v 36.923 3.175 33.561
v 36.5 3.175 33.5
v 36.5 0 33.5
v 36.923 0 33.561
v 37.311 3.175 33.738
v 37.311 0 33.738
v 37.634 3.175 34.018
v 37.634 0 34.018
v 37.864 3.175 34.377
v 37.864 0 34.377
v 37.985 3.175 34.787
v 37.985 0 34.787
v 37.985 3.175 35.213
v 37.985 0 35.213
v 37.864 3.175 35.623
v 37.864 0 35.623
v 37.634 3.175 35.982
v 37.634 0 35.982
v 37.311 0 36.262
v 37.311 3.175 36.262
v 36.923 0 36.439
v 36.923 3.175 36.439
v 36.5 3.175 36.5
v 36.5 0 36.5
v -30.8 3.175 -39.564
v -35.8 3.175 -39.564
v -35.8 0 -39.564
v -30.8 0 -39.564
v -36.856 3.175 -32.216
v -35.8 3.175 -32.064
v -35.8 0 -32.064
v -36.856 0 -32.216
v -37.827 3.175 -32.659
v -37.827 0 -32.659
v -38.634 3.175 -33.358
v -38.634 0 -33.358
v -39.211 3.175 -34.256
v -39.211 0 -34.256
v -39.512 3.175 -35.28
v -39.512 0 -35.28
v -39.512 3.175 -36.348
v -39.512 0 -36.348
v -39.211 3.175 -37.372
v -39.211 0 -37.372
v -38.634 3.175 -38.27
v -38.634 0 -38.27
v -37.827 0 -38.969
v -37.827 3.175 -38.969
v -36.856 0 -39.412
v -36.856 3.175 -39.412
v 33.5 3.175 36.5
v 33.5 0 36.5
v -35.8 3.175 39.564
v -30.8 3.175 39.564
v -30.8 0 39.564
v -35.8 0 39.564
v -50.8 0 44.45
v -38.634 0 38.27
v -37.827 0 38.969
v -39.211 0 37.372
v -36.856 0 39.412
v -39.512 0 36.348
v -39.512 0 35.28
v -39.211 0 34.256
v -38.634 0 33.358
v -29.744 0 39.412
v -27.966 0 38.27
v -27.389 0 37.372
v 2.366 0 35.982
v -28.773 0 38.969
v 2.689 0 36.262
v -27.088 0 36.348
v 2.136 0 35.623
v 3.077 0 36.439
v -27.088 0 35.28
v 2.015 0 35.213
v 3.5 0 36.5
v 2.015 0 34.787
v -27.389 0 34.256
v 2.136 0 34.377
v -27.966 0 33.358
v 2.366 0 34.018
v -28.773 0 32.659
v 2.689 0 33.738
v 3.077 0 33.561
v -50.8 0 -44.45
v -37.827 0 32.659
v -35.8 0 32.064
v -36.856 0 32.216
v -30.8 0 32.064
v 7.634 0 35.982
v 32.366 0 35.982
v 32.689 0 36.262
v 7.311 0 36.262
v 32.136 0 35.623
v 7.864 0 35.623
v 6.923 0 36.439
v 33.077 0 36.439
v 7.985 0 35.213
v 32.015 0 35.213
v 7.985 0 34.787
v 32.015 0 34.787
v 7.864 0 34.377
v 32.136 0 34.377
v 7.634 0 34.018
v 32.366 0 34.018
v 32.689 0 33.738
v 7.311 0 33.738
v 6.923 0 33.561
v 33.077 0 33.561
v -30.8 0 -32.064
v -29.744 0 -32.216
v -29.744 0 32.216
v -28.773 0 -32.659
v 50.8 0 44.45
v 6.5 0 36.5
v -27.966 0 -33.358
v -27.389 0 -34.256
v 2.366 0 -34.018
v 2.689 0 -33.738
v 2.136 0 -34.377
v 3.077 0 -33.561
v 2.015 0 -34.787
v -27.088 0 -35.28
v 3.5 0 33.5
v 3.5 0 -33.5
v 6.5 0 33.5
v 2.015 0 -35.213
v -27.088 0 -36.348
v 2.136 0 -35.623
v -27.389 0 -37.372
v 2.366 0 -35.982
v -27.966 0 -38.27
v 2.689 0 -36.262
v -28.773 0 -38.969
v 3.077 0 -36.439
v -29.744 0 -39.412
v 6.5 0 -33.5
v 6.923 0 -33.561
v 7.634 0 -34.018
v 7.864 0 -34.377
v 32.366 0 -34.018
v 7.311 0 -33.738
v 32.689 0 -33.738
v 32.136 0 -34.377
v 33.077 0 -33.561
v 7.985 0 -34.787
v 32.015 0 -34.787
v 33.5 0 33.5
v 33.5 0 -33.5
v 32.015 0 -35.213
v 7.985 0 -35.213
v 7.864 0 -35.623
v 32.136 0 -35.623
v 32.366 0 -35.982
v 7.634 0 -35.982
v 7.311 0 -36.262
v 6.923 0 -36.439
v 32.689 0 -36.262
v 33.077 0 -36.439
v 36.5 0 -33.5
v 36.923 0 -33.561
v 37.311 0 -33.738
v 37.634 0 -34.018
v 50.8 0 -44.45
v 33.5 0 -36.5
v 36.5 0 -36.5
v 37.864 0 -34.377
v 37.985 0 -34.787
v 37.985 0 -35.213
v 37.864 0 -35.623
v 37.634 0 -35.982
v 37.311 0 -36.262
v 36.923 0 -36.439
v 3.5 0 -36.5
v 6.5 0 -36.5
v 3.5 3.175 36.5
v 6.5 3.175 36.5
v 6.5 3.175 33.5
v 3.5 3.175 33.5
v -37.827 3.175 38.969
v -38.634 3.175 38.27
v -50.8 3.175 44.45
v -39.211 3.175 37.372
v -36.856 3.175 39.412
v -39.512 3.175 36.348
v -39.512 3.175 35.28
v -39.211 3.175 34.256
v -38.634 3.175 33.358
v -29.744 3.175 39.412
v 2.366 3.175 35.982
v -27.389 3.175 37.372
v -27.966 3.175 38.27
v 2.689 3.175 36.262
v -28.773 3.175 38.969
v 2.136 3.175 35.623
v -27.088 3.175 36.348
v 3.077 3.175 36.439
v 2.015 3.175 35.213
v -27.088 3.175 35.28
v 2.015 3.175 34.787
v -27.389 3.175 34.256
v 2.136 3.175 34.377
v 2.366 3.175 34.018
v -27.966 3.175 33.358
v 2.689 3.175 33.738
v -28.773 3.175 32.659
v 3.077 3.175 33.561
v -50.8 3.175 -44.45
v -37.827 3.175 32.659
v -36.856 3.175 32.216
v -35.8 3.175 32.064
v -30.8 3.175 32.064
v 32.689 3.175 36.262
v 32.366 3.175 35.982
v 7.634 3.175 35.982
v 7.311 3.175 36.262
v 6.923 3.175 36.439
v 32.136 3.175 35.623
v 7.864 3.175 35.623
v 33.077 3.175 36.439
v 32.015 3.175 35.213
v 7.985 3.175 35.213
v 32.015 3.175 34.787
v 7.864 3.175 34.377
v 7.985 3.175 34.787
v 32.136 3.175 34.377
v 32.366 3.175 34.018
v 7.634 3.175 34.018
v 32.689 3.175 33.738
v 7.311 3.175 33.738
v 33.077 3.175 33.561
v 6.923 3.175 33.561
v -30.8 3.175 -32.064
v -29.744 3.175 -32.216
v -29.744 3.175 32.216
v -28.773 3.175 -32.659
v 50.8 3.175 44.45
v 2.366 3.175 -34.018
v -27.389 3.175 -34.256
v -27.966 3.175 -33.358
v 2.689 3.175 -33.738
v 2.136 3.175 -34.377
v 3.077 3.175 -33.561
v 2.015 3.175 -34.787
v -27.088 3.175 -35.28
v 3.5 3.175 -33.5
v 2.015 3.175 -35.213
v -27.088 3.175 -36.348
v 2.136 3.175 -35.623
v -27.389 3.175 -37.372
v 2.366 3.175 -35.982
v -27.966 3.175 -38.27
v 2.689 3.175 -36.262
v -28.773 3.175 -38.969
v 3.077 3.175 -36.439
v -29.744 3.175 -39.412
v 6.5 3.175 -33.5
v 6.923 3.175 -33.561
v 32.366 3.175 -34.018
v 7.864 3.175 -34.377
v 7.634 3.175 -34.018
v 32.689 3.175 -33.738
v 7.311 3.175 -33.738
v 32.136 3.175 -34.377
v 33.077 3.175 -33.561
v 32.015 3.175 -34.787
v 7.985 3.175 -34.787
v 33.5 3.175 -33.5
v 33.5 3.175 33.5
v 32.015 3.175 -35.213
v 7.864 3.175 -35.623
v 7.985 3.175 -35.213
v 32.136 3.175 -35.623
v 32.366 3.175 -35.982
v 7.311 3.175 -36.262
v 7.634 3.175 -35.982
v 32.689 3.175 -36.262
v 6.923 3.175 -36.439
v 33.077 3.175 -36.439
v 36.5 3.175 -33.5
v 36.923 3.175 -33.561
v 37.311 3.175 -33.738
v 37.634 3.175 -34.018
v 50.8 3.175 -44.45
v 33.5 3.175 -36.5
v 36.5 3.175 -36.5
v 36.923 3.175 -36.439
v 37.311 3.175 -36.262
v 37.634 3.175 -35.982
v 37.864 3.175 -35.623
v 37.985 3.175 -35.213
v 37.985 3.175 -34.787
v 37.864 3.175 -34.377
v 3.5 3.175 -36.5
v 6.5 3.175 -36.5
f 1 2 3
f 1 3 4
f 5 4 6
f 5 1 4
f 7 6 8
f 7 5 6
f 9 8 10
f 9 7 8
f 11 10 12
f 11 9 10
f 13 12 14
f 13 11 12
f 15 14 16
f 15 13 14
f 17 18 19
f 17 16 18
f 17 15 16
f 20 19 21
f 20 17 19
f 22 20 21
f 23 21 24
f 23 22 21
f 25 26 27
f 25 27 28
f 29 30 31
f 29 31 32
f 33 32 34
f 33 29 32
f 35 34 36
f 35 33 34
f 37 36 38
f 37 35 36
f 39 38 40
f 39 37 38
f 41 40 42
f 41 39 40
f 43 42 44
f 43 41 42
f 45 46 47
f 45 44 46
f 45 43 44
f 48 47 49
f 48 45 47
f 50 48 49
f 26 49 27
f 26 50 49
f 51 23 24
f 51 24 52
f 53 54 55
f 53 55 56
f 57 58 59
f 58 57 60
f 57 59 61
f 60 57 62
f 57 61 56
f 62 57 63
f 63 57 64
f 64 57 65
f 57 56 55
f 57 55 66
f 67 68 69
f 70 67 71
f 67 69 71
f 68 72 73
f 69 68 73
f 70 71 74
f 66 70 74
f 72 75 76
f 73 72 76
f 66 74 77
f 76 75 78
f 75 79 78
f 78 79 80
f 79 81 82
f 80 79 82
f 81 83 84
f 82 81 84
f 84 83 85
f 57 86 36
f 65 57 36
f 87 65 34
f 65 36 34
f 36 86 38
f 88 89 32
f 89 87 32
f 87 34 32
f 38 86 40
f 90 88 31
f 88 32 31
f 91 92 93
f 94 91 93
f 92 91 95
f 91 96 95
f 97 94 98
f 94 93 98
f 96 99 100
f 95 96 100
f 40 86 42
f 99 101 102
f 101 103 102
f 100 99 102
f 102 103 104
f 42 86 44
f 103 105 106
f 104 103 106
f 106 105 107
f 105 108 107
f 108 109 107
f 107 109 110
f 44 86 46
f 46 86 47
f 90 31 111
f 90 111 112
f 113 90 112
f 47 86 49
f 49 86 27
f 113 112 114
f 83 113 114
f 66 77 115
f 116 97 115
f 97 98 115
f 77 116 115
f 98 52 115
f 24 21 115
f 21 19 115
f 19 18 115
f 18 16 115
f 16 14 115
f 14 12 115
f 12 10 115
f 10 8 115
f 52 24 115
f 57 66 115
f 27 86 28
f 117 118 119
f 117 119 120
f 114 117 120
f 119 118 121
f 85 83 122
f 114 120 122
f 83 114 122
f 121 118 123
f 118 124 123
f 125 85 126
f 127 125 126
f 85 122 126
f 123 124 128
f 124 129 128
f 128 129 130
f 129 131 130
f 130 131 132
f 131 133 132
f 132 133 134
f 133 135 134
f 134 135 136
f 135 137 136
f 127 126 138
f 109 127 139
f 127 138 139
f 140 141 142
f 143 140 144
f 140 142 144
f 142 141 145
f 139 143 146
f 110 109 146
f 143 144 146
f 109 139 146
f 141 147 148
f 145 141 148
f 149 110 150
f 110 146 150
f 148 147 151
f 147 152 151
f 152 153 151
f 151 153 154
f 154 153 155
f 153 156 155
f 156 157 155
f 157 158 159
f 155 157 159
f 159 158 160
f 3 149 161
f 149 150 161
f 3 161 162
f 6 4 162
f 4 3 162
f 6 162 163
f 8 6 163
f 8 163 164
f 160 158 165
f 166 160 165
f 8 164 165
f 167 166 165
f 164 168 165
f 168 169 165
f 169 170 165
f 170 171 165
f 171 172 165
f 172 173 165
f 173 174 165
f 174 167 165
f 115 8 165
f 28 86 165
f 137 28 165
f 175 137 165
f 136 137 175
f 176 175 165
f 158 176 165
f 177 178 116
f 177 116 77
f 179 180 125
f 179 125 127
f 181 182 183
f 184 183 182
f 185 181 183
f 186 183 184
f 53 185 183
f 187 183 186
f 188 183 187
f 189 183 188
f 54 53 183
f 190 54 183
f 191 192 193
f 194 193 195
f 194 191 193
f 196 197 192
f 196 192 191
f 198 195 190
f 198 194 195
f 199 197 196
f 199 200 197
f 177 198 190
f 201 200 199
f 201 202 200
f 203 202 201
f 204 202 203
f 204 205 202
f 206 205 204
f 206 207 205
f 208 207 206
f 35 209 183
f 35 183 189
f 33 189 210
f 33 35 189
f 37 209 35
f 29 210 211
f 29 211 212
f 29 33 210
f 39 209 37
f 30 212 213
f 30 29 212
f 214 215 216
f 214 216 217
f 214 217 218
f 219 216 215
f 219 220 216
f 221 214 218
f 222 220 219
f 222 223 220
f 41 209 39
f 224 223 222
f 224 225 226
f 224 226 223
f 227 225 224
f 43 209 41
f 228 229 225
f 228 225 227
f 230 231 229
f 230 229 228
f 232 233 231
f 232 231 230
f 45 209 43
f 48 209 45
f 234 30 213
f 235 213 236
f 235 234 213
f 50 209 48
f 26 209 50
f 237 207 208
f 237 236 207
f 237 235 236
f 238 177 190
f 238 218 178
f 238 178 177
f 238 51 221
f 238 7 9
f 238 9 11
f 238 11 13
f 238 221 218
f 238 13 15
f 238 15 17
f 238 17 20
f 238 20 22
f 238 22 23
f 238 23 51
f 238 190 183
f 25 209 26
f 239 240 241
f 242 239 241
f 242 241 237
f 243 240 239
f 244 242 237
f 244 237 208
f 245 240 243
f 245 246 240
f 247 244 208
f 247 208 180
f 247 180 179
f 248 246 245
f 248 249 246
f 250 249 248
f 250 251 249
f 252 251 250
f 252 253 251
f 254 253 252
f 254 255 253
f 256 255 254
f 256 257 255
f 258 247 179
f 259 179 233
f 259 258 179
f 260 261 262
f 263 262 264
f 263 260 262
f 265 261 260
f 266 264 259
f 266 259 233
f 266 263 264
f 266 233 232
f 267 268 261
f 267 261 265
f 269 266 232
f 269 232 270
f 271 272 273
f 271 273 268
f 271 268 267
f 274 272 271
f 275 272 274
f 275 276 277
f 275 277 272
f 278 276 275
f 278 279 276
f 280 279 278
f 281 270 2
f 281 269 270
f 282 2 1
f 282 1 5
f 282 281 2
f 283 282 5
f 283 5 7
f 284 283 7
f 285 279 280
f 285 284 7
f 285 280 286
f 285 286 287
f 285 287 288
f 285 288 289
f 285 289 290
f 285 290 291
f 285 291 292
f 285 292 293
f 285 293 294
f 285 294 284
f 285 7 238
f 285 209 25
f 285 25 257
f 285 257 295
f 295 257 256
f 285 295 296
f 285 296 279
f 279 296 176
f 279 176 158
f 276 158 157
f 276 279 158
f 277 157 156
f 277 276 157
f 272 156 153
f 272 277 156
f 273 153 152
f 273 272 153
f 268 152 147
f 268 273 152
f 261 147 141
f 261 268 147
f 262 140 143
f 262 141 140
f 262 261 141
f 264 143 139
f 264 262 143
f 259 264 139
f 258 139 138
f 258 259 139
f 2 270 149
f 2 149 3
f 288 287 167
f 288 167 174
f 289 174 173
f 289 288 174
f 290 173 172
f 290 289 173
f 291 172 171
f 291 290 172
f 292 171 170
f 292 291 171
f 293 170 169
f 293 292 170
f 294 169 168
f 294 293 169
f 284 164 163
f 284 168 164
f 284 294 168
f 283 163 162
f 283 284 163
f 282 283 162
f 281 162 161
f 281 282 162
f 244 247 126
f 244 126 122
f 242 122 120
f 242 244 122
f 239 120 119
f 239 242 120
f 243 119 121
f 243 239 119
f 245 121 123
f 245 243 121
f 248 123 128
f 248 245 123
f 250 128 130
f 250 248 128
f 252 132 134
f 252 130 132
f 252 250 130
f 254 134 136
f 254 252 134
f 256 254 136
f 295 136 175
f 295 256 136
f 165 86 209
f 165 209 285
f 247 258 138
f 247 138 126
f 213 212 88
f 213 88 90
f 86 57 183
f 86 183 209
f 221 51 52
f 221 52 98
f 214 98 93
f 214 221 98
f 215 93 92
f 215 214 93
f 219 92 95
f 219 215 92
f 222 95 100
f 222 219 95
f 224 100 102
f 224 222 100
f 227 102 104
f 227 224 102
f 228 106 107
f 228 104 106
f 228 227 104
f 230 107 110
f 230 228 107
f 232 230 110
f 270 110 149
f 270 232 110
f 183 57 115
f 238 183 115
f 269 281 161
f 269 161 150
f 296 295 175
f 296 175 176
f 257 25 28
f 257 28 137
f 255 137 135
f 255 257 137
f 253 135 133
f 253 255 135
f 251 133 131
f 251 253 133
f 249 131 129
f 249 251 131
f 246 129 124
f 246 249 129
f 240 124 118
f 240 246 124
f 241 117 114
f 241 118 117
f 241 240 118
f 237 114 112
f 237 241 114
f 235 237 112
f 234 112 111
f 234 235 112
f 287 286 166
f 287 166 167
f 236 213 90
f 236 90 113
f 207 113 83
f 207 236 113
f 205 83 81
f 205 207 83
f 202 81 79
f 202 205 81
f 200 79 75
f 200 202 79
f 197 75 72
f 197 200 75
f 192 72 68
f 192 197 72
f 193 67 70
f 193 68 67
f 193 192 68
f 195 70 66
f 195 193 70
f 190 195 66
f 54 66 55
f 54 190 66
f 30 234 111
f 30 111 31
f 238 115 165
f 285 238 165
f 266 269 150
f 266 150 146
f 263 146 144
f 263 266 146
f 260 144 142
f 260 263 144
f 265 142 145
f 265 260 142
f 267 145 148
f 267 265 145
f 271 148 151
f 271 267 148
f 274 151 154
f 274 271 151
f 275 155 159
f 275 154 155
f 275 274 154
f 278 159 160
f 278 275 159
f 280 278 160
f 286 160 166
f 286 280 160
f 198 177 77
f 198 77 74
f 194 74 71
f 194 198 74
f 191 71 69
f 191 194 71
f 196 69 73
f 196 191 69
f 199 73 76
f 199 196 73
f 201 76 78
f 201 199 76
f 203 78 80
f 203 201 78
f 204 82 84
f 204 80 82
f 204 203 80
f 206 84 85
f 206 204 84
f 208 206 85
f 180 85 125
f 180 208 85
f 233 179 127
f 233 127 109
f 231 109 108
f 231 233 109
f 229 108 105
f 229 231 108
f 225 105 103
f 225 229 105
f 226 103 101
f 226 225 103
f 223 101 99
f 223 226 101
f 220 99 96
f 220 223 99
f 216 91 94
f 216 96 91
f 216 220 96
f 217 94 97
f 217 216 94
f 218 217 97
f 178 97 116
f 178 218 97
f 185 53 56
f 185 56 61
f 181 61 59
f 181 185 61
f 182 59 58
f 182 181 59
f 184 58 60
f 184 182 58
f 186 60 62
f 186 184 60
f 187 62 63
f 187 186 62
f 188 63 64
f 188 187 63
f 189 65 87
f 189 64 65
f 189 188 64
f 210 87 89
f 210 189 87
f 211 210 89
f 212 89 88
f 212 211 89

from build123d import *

# Parameters (mm, degrees)
SKETCH1_W           = 101.6
SKETCH1_H           = 88.9
BOSS_EXTRUDE1_DEPTH = 3.175
CUT_EXTRUDE1_DEPTH  = 68.576054376


with BuildPart() as part:
    # Sketch1 → Boss-Extrude1 (new body)
    with BuildSketch(Plane(origin=(0, 0, 0), x_dir=(1, 0, 0), z_dir=(0, 1, 0))):
        Rectangle(SKETCH1_W, SKETCH1_H)
    extrude(amount=BOSS_EXTRUDE1_DEPTH)

    # Sketch2 → Cut-Extrude1 (cut, through all)
    with BuildSketch(Plane(origin=(0, 3.175, 0), x_dir=(1, 0, 0), z_dir=(0, 1, 0))):
        with BuildLine():
            Line((-35.8, 39.564), (-30.8, 39.564))
            ThreePointArc((-30.8, 39.564), (-27.05, 35.814), (-30.8, 32.064))
            Line((-30.8, 32.064), (-35.8, 32.064))
            ThreePointArc((-35.8, 32.064), (-39.55, 35.814), (-35.8, 39.564))
        make_face()
        with BuildLine():
            Line((-35.8, -32.064), (-30.8, -32.064))
            ThreePointArc((-30.8, -32.064), (-27.05, -35.814), (-30.8, -39.564))
            Line((-30.8, -39.564), (-35.8, -39.564))
            ThreePointArc((-35.8, -39.564), (-39.55, -35.814), (-35.8, -32.064))
        make_face()
        with BuildLine():
            Line((3.5, 36.5), (6.5, 36.5))
            ThreePointArc((6.5, 36.5), (8, 35), (6.5, 33.5))
            Line((6.5, 33.5), (3.5, 33.5))
            ThreePointArc((3.5, 33.5), (2, 35), (3.5, 36.5))
        make_face()
        with BuildLine():
            Line((33.5, 36.5), (36.5, 36.5))
            ThreePointArc((36.5, 36.5), (38, 35), (36.5, 33.5))
            Line((36.5, 33.5), (33.5, 33.5))
            ThreePointArc((33.5, 33.5), (32, 35), (33.5, 36.5))
        make_face()
        with BuildLine():
            Line((3.5, -33.5), (6.5, -33.5))
            ThreePointArc((6.5, -33.5), (8, -35), (6.5, -36.5))
            Line((6.5, -36.5), (3.5, -36.5))
            ThreePointArc((3.5, -36.5), (2, -35), (3.5, -33.5))
        make_face()
        with BuildLine():
            Line((33.5, -33.5), (36.5, -33.5))
            ThreePointArc((36.5, -33.5), (38, -35), (36.5, -36.5))
            Line((36.5, -36.5), (33.5, -36.5))
            ThreePointArc((33.5, -36.5), (32, -35), (33.5, -33.5))
        make_face()
    extrude(amount=-CUT_EXTRUDE1_DEPTH, mode=Mode.SUBTRACT)


solid = part.part
